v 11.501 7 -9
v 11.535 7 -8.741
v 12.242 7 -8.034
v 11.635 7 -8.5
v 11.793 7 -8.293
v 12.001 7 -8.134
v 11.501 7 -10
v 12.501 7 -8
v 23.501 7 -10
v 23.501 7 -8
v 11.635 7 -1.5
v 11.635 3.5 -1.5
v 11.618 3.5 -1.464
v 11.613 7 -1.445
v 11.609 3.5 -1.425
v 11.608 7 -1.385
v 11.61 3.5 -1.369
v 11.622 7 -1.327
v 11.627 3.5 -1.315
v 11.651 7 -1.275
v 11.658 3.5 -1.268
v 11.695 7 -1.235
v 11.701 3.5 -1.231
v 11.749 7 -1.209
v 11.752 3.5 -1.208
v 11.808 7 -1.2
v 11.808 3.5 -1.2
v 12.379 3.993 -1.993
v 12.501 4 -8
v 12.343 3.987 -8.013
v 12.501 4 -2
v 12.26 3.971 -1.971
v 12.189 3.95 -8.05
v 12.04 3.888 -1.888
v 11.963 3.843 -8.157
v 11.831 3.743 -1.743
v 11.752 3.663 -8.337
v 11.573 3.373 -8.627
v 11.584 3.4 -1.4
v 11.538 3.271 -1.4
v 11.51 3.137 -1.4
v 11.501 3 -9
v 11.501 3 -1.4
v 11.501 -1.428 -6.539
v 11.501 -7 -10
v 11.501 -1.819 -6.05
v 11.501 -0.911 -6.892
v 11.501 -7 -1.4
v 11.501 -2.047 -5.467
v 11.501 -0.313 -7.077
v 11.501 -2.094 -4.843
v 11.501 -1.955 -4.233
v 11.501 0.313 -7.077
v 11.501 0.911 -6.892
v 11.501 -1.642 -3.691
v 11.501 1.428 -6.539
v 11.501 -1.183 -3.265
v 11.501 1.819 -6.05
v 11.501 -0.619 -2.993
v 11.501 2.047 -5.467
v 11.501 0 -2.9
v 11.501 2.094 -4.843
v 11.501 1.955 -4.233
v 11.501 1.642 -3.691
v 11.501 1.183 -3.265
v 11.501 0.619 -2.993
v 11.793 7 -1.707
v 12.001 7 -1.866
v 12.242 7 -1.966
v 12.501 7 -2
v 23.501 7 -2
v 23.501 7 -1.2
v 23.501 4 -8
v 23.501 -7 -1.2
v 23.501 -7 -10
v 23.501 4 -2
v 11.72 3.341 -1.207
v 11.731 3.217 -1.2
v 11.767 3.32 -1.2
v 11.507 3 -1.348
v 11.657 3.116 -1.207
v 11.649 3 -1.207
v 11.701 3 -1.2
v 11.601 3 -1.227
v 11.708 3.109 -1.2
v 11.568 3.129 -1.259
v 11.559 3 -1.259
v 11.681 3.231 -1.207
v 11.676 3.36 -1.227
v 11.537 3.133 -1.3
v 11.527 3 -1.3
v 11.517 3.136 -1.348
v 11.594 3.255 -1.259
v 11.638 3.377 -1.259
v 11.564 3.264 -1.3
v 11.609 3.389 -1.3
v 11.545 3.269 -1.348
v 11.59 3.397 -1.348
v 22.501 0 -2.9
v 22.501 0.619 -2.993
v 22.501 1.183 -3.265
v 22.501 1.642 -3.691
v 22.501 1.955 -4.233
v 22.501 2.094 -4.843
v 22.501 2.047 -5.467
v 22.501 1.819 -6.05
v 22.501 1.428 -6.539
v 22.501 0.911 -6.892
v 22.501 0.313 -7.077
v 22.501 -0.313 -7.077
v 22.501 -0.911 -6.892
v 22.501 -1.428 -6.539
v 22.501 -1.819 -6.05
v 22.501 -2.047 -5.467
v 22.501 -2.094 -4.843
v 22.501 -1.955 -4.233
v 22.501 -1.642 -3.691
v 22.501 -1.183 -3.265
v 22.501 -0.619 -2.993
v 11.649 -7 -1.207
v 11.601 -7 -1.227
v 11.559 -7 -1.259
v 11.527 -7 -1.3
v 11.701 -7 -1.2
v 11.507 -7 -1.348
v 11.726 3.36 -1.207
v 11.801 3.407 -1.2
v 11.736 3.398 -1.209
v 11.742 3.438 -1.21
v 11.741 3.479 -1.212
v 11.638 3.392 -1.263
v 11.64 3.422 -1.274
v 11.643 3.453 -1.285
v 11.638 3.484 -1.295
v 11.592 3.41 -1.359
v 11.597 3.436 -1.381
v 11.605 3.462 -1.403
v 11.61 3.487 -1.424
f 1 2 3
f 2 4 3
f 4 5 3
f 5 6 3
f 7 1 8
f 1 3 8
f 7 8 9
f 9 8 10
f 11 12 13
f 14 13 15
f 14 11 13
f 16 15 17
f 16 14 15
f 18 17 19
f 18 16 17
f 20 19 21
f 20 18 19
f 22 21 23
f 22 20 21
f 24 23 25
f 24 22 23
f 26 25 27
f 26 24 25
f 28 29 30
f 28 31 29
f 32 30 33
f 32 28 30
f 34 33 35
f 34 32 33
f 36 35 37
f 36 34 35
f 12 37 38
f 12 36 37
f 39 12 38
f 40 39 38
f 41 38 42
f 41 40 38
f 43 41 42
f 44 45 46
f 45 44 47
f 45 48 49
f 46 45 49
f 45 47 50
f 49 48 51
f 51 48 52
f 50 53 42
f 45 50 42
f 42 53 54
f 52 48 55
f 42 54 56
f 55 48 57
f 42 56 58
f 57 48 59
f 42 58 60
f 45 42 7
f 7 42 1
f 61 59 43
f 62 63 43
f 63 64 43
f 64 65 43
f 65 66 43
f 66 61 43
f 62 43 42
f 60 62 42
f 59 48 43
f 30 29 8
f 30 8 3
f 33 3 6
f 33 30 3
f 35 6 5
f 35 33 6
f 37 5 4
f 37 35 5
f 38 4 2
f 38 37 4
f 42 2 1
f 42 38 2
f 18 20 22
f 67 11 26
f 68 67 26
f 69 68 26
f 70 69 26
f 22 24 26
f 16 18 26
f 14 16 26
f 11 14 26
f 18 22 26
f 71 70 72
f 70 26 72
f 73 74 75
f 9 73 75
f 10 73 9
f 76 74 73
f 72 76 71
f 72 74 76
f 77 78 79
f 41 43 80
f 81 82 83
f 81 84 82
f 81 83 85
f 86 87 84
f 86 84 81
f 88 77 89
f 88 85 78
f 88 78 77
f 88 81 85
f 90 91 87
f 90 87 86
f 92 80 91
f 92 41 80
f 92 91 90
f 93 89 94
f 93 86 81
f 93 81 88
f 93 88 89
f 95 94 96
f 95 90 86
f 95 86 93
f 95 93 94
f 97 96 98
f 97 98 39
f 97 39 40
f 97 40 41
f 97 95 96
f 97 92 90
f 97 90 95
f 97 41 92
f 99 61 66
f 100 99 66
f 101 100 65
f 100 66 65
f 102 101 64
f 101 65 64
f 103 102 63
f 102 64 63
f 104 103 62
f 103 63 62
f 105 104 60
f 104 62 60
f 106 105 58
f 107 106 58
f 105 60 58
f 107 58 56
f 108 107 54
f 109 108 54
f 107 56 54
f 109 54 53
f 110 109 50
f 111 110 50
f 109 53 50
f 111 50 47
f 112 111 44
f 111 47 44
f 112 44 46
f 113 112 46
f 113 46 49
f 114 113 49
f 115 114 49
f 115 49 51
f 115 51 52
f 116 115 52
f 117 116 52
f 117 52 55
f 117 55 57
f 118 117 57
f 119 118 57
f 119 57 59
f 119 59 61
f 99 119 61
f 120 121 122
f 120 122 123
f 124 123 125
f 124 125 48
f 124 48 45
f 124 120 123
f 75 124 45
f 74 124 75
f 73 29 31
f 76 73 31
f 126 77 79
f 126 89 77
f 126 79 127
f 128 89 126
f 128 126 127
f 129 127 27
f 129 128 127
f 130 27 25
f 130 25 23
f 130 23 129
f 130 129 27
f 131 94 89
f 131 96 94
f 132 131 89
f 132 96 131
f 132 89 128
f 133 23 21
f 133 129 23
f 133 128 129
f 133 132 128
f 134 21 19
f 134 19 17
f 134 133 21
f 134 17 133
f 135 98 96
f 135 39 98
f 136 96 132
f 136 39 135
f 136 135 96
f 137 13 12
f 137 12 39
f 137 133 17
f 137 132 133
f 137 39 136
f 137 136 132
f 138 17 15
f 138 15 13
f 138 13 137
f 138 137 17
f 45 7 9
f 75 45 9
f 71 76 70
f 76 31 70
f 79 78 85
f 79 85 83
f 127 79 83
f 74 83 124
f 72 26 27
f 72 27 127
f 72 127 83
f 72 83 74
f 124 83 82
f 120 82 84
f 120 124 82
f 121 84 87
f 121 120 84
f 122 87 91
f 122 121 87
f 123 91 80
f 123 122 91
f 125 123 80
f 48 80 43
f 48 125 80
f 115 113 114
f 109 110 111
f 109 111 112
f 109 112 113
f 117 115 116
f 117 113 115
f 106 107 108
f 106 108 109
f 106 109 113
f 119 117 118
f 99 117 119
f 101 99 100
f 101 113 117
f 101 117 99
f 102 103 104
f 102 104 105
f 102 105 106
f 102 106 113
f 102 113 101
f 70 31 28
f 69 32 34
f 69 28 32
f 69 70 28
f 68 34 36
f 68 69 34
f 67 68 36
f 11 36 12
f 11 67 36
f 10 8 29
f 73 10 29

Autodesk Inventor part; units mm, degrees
ref_plane "YZ Plane" through (0, 0, 0) normal (1, 0, 0) x (0, 1, 0)
ref_plane "XZ Plane" through (0, 0, 0) normal (0, 1, 0) x (-1, 0, 0)
ref_plane "XY Plane" through (0, 0, 0) normal (0, 0, 1) x (1, 0, 0)
sketch "Эскиз1" plane through (0, 0, 0) normal (0, 0, 1) x (1, 0, 0)
  line L0 (-0.9994, -4.532) -> (-0.9994, -7) projected
  line L1 (-0.9994, -7) -> (4.0006, -7) projected
  line L2 (4.0006, -7) -> (4.0006, 7) projected
  line L3 (4.0006, 7) -> (1.6539, 7) projected
  arc A0 (1.6539, 7) -> (-1.5392, 5.8477) centre (1.6539, 2) ccw projected
  spline S0 degree 3 poles (-1.5392, 5.8477) (-1.841, 5.5961) (-2.3851, 5.1007) (-2.9171, 4.5079) (-3.3417, 3.9411) (-3.598, 3.5113) (-3.8018, 3.0569) (-3.8945, 2.7699) (-3.9568, 2.4926) (-3.9838, 2.3119) (-4.0006, 2.0887) (-4.0006, 1.9113) (-3.9838, 1.6881) (-3.9568, 1.5074) (-3.8945, 1.2301) (-3.8018, 0.9431) (-3.598, 0.4887) (-3.3417, 0.0589) (-2.9342, -0.485) (-2.6405, -0.8158) (-2.428, -1.0328) knots -1 -1 -1 -1 -0.916667 -0.833333 -0.791667 -0.708333 -0.666667 -0.604167 -0.583333 -0.541667 -0.520833 -0.479167 -0.458333 -0.416667 -0.395833 -0.333333 -0.291667 -0.208333 -0.166667 -0.091743 -0.091743 -0.091743 -0.091743 projected
  spline S1 degree 3 poles (-2.428, -1.0328) (-2.2019, -1.2635) (-1.7947, -1.7688) (-1.3413, -2.6303) (-1.0622, -3.563) (-0.9994, -4.209) (-0.9994, -4.532) knots -1 -1 -1 -1 -0.75 -0.5 -0.25 0 0 0 0 projected
  circle A1 centre (28.5006, -1) radius 2.1 projected
  circle A2 centre (-2.1462, 18.5) radius 2.1 projected
  circle A3 centre (-9.0714, -1) radius 2.1 projected
  spline S2 degree 3 poles (-2.4745, 7.8043) (-2.4902, 7.5514) (-2.5538, 7.3036) (-2.7702, 6.8452) (-2.921, 6.6386) (-3.1063, 6.4657) knots 0 0 0 0 0.076038 0.076038 0.152076 0.152076 0.152076 0.152076 projected
  arc A4 (-2.2745, 9.4079) -> (-2.4745, 7.8043) centre (10.5006, 7) ccw projected
  line L4 (8.0006, -7) -> (40.3538, -7) projected
  line L5 (40.3538, -7) -> (22.9061, 16.2926) projected
  arc A5 (22.9061, 16.2926) -> (10.5006, 22.5) centre (10.5006, 7) ccw projected
  line L6 (10.5006, 22.5) -> (-10.3517, 22.5) projected
  line L7 (-10.3517, 22.5) -> (-11.2994, 21.5522) projected
  arc A6 (-11.2994, 21.5522) -> (-11.8548, 20.4853) centre (-9.8852, 20.138) ccw projected
  line L8 (-11.8548, 20.4853) -> (-11.9558, 19.9127) projected
  line L9 (-11.9558, 19.9127) -> (-6.1462, 19.9127) projected
  line L10 (-6.1462, 19.9127) -> (-6.1462, 17.7127) projected
  line L11 (-6.1462, 17.7127) -> (-12.3437, 17.7127) projected
  line L12 (-12.3437, 17.7127) -> (-16.3486, -5) projected
  line L13 (-16.3486, -5) -> (-9.5088, -5) projected
  line L14 (-9.5088, -5) -> (-9.5088, -7) projected
  line L15 (-9.5088, -7) -> (-2.4994, -7) projected
  line L16 (-2.4994, -7) -> (-2.4994, -3.9012) projected
  spline S3 degree 3 poles (-3.1312, -2.4424) (-2.9413, -2.6206) (-2.7879, -2.8341) (-2.6206, -3.201) (-2.5754, -3.3369) (-2.5147, -3.616) (-2.4994, -3.7584) (-2.4994, -3.9012) knots 0 0 0 0 0.078129 0.078129 0.12097 0.12097 0.16381 0.16381 0.16381 0.16381 projected
  spline S4 degree 2 poles (-3.1312, -2.4424) (-7.8801, 2.0117) (-3.1063, 6.4657) knots -0.944242 -0.944242 -0.944242 -0.053426 -0.053426 -0.053426 projected
  line L17 (23.5006, -7) -> (11.5006, -7)
  line L18 (11.5006, -7) -> (11.5006, 7)
  line L19 (11.5006, 7) -> (23.5006, 7)
  line L20 (23.5006, -7) -> (23.5006, 7)
  spline S5 degree 3 poles (-1.1225, 10.2083) (-1.2509, 10.2303) (-1.3823, 10.2271) (-1.6365, 10.1704) (-1.7568, 10.1175) (-1.9705, 9.9686) (-2.0617, 9.874) (-2.2023, 9.656) (-2.2506, 9.5349) (-2.2745, 9.4079) knots 0 0 0 0 0.039064 0.039064 0.078129 0.078129 0.117193 0.117193 0.155946 0.155946 0.155946 0.155946 projected
  spline S6 degree 2 poles (-1.1225, 10.2083) (8.092, 8.6257) (8.0006, 7) knots 0.047114 0.047114 0.047114 1 1 1 projected
  line L21 (8.0006, 7) -> (8.0006, -7) projected
  point P0 (0, 0)
  dimension "d0" = 12
extrude "Выдавливание1" add sketch "Эскиз1" against normal blind 10 contours L18 L19 L20 L4
sketch "Эскиз2" plane through (11.5006, -7, 0) normal (-1, 0, 0) x (0, 0, 1)
  line L0 (0, 14) -> (0, 0) projected
  line L1 (0, 14) -> (-10, 14) projected
  line L2 (-10, 0) -> (-10, 14) projected
  line L3 (0, 0) -> (-10, 0) projected
  line L4 (0, 14) -> (-10, 14) projected
  line L5 (-5, 14) -> (-5, 0)
  circle A0 centre (-5, 7) radius 2.1
  point P0 (0, 7)
  dimension "d3" = 4.2
extrude "Выдавливание2" cut sketch "Эскиз2" against normal blind 11 contours A0 L5 | L5 A0
sketch "Эскиз3" plane through (11.5006, -7, 0) normal (-1, 0, 0) x (0, 0, 1)
  circle A0 centre (-5, 7) radius 2.1 projected
  line L0 (0, 14) -> (0, 0) projected
  line L1 (0, 14) -> (-10, 14) projected
  line L2 (-10, 0) -> (-10, 14) projected
  line L3 (0, 0) -> (-10, 0) projected
  line L4 (0, 14) -> (-10, 14) projected
  line L5 (-2, 14) -> (-8, 14)
  line L6 (-8, 14) -> (-8, 11)
  line L7 (-8, 11) -> (-2, 11)
  line L8 (-2, 11) -> (-2, 14)
  point P0 (0, 7)
  dimension "d6" = 2
  dimension "d7" = 2
  dimension "d8" = 3
extrude "Выдавливание3" cut sketch "Эскиз3" against normal blind 15 contours L8 L7 L6 L1
fillet "Сопряжение1" radius 1 3 edges at (11.5006, 5.5, -8) (11.5006, 4, -5) (11.5006, 5.5, -2)
sketch "Эскиз4" plane through (0, 0, 0) normal (0, 0, 1) x (1, 0, 0)
  line L0 (11.5006, 7) -> (11.5006, -7) projected
  line L1 (23.5006, 7) -> (11.5006, 7) projected
  line L2 (23.5006, -7) -> (23.5006, 7) projected
  line L3 (8.0006, -7) -> (40.3538, -7) projected
  point P0 (0, 0)
extrude "Выдавливание4" cut sketch "Эскиз4" against normal blind 1.2
fillet "Сопряжение2" radius 0.2 3 edges at (11.5056, 3.1005, -1.2) (11.5006, -2, -1.2) (11.5208, 5.1, -1.2)
properties part number "upor2"
